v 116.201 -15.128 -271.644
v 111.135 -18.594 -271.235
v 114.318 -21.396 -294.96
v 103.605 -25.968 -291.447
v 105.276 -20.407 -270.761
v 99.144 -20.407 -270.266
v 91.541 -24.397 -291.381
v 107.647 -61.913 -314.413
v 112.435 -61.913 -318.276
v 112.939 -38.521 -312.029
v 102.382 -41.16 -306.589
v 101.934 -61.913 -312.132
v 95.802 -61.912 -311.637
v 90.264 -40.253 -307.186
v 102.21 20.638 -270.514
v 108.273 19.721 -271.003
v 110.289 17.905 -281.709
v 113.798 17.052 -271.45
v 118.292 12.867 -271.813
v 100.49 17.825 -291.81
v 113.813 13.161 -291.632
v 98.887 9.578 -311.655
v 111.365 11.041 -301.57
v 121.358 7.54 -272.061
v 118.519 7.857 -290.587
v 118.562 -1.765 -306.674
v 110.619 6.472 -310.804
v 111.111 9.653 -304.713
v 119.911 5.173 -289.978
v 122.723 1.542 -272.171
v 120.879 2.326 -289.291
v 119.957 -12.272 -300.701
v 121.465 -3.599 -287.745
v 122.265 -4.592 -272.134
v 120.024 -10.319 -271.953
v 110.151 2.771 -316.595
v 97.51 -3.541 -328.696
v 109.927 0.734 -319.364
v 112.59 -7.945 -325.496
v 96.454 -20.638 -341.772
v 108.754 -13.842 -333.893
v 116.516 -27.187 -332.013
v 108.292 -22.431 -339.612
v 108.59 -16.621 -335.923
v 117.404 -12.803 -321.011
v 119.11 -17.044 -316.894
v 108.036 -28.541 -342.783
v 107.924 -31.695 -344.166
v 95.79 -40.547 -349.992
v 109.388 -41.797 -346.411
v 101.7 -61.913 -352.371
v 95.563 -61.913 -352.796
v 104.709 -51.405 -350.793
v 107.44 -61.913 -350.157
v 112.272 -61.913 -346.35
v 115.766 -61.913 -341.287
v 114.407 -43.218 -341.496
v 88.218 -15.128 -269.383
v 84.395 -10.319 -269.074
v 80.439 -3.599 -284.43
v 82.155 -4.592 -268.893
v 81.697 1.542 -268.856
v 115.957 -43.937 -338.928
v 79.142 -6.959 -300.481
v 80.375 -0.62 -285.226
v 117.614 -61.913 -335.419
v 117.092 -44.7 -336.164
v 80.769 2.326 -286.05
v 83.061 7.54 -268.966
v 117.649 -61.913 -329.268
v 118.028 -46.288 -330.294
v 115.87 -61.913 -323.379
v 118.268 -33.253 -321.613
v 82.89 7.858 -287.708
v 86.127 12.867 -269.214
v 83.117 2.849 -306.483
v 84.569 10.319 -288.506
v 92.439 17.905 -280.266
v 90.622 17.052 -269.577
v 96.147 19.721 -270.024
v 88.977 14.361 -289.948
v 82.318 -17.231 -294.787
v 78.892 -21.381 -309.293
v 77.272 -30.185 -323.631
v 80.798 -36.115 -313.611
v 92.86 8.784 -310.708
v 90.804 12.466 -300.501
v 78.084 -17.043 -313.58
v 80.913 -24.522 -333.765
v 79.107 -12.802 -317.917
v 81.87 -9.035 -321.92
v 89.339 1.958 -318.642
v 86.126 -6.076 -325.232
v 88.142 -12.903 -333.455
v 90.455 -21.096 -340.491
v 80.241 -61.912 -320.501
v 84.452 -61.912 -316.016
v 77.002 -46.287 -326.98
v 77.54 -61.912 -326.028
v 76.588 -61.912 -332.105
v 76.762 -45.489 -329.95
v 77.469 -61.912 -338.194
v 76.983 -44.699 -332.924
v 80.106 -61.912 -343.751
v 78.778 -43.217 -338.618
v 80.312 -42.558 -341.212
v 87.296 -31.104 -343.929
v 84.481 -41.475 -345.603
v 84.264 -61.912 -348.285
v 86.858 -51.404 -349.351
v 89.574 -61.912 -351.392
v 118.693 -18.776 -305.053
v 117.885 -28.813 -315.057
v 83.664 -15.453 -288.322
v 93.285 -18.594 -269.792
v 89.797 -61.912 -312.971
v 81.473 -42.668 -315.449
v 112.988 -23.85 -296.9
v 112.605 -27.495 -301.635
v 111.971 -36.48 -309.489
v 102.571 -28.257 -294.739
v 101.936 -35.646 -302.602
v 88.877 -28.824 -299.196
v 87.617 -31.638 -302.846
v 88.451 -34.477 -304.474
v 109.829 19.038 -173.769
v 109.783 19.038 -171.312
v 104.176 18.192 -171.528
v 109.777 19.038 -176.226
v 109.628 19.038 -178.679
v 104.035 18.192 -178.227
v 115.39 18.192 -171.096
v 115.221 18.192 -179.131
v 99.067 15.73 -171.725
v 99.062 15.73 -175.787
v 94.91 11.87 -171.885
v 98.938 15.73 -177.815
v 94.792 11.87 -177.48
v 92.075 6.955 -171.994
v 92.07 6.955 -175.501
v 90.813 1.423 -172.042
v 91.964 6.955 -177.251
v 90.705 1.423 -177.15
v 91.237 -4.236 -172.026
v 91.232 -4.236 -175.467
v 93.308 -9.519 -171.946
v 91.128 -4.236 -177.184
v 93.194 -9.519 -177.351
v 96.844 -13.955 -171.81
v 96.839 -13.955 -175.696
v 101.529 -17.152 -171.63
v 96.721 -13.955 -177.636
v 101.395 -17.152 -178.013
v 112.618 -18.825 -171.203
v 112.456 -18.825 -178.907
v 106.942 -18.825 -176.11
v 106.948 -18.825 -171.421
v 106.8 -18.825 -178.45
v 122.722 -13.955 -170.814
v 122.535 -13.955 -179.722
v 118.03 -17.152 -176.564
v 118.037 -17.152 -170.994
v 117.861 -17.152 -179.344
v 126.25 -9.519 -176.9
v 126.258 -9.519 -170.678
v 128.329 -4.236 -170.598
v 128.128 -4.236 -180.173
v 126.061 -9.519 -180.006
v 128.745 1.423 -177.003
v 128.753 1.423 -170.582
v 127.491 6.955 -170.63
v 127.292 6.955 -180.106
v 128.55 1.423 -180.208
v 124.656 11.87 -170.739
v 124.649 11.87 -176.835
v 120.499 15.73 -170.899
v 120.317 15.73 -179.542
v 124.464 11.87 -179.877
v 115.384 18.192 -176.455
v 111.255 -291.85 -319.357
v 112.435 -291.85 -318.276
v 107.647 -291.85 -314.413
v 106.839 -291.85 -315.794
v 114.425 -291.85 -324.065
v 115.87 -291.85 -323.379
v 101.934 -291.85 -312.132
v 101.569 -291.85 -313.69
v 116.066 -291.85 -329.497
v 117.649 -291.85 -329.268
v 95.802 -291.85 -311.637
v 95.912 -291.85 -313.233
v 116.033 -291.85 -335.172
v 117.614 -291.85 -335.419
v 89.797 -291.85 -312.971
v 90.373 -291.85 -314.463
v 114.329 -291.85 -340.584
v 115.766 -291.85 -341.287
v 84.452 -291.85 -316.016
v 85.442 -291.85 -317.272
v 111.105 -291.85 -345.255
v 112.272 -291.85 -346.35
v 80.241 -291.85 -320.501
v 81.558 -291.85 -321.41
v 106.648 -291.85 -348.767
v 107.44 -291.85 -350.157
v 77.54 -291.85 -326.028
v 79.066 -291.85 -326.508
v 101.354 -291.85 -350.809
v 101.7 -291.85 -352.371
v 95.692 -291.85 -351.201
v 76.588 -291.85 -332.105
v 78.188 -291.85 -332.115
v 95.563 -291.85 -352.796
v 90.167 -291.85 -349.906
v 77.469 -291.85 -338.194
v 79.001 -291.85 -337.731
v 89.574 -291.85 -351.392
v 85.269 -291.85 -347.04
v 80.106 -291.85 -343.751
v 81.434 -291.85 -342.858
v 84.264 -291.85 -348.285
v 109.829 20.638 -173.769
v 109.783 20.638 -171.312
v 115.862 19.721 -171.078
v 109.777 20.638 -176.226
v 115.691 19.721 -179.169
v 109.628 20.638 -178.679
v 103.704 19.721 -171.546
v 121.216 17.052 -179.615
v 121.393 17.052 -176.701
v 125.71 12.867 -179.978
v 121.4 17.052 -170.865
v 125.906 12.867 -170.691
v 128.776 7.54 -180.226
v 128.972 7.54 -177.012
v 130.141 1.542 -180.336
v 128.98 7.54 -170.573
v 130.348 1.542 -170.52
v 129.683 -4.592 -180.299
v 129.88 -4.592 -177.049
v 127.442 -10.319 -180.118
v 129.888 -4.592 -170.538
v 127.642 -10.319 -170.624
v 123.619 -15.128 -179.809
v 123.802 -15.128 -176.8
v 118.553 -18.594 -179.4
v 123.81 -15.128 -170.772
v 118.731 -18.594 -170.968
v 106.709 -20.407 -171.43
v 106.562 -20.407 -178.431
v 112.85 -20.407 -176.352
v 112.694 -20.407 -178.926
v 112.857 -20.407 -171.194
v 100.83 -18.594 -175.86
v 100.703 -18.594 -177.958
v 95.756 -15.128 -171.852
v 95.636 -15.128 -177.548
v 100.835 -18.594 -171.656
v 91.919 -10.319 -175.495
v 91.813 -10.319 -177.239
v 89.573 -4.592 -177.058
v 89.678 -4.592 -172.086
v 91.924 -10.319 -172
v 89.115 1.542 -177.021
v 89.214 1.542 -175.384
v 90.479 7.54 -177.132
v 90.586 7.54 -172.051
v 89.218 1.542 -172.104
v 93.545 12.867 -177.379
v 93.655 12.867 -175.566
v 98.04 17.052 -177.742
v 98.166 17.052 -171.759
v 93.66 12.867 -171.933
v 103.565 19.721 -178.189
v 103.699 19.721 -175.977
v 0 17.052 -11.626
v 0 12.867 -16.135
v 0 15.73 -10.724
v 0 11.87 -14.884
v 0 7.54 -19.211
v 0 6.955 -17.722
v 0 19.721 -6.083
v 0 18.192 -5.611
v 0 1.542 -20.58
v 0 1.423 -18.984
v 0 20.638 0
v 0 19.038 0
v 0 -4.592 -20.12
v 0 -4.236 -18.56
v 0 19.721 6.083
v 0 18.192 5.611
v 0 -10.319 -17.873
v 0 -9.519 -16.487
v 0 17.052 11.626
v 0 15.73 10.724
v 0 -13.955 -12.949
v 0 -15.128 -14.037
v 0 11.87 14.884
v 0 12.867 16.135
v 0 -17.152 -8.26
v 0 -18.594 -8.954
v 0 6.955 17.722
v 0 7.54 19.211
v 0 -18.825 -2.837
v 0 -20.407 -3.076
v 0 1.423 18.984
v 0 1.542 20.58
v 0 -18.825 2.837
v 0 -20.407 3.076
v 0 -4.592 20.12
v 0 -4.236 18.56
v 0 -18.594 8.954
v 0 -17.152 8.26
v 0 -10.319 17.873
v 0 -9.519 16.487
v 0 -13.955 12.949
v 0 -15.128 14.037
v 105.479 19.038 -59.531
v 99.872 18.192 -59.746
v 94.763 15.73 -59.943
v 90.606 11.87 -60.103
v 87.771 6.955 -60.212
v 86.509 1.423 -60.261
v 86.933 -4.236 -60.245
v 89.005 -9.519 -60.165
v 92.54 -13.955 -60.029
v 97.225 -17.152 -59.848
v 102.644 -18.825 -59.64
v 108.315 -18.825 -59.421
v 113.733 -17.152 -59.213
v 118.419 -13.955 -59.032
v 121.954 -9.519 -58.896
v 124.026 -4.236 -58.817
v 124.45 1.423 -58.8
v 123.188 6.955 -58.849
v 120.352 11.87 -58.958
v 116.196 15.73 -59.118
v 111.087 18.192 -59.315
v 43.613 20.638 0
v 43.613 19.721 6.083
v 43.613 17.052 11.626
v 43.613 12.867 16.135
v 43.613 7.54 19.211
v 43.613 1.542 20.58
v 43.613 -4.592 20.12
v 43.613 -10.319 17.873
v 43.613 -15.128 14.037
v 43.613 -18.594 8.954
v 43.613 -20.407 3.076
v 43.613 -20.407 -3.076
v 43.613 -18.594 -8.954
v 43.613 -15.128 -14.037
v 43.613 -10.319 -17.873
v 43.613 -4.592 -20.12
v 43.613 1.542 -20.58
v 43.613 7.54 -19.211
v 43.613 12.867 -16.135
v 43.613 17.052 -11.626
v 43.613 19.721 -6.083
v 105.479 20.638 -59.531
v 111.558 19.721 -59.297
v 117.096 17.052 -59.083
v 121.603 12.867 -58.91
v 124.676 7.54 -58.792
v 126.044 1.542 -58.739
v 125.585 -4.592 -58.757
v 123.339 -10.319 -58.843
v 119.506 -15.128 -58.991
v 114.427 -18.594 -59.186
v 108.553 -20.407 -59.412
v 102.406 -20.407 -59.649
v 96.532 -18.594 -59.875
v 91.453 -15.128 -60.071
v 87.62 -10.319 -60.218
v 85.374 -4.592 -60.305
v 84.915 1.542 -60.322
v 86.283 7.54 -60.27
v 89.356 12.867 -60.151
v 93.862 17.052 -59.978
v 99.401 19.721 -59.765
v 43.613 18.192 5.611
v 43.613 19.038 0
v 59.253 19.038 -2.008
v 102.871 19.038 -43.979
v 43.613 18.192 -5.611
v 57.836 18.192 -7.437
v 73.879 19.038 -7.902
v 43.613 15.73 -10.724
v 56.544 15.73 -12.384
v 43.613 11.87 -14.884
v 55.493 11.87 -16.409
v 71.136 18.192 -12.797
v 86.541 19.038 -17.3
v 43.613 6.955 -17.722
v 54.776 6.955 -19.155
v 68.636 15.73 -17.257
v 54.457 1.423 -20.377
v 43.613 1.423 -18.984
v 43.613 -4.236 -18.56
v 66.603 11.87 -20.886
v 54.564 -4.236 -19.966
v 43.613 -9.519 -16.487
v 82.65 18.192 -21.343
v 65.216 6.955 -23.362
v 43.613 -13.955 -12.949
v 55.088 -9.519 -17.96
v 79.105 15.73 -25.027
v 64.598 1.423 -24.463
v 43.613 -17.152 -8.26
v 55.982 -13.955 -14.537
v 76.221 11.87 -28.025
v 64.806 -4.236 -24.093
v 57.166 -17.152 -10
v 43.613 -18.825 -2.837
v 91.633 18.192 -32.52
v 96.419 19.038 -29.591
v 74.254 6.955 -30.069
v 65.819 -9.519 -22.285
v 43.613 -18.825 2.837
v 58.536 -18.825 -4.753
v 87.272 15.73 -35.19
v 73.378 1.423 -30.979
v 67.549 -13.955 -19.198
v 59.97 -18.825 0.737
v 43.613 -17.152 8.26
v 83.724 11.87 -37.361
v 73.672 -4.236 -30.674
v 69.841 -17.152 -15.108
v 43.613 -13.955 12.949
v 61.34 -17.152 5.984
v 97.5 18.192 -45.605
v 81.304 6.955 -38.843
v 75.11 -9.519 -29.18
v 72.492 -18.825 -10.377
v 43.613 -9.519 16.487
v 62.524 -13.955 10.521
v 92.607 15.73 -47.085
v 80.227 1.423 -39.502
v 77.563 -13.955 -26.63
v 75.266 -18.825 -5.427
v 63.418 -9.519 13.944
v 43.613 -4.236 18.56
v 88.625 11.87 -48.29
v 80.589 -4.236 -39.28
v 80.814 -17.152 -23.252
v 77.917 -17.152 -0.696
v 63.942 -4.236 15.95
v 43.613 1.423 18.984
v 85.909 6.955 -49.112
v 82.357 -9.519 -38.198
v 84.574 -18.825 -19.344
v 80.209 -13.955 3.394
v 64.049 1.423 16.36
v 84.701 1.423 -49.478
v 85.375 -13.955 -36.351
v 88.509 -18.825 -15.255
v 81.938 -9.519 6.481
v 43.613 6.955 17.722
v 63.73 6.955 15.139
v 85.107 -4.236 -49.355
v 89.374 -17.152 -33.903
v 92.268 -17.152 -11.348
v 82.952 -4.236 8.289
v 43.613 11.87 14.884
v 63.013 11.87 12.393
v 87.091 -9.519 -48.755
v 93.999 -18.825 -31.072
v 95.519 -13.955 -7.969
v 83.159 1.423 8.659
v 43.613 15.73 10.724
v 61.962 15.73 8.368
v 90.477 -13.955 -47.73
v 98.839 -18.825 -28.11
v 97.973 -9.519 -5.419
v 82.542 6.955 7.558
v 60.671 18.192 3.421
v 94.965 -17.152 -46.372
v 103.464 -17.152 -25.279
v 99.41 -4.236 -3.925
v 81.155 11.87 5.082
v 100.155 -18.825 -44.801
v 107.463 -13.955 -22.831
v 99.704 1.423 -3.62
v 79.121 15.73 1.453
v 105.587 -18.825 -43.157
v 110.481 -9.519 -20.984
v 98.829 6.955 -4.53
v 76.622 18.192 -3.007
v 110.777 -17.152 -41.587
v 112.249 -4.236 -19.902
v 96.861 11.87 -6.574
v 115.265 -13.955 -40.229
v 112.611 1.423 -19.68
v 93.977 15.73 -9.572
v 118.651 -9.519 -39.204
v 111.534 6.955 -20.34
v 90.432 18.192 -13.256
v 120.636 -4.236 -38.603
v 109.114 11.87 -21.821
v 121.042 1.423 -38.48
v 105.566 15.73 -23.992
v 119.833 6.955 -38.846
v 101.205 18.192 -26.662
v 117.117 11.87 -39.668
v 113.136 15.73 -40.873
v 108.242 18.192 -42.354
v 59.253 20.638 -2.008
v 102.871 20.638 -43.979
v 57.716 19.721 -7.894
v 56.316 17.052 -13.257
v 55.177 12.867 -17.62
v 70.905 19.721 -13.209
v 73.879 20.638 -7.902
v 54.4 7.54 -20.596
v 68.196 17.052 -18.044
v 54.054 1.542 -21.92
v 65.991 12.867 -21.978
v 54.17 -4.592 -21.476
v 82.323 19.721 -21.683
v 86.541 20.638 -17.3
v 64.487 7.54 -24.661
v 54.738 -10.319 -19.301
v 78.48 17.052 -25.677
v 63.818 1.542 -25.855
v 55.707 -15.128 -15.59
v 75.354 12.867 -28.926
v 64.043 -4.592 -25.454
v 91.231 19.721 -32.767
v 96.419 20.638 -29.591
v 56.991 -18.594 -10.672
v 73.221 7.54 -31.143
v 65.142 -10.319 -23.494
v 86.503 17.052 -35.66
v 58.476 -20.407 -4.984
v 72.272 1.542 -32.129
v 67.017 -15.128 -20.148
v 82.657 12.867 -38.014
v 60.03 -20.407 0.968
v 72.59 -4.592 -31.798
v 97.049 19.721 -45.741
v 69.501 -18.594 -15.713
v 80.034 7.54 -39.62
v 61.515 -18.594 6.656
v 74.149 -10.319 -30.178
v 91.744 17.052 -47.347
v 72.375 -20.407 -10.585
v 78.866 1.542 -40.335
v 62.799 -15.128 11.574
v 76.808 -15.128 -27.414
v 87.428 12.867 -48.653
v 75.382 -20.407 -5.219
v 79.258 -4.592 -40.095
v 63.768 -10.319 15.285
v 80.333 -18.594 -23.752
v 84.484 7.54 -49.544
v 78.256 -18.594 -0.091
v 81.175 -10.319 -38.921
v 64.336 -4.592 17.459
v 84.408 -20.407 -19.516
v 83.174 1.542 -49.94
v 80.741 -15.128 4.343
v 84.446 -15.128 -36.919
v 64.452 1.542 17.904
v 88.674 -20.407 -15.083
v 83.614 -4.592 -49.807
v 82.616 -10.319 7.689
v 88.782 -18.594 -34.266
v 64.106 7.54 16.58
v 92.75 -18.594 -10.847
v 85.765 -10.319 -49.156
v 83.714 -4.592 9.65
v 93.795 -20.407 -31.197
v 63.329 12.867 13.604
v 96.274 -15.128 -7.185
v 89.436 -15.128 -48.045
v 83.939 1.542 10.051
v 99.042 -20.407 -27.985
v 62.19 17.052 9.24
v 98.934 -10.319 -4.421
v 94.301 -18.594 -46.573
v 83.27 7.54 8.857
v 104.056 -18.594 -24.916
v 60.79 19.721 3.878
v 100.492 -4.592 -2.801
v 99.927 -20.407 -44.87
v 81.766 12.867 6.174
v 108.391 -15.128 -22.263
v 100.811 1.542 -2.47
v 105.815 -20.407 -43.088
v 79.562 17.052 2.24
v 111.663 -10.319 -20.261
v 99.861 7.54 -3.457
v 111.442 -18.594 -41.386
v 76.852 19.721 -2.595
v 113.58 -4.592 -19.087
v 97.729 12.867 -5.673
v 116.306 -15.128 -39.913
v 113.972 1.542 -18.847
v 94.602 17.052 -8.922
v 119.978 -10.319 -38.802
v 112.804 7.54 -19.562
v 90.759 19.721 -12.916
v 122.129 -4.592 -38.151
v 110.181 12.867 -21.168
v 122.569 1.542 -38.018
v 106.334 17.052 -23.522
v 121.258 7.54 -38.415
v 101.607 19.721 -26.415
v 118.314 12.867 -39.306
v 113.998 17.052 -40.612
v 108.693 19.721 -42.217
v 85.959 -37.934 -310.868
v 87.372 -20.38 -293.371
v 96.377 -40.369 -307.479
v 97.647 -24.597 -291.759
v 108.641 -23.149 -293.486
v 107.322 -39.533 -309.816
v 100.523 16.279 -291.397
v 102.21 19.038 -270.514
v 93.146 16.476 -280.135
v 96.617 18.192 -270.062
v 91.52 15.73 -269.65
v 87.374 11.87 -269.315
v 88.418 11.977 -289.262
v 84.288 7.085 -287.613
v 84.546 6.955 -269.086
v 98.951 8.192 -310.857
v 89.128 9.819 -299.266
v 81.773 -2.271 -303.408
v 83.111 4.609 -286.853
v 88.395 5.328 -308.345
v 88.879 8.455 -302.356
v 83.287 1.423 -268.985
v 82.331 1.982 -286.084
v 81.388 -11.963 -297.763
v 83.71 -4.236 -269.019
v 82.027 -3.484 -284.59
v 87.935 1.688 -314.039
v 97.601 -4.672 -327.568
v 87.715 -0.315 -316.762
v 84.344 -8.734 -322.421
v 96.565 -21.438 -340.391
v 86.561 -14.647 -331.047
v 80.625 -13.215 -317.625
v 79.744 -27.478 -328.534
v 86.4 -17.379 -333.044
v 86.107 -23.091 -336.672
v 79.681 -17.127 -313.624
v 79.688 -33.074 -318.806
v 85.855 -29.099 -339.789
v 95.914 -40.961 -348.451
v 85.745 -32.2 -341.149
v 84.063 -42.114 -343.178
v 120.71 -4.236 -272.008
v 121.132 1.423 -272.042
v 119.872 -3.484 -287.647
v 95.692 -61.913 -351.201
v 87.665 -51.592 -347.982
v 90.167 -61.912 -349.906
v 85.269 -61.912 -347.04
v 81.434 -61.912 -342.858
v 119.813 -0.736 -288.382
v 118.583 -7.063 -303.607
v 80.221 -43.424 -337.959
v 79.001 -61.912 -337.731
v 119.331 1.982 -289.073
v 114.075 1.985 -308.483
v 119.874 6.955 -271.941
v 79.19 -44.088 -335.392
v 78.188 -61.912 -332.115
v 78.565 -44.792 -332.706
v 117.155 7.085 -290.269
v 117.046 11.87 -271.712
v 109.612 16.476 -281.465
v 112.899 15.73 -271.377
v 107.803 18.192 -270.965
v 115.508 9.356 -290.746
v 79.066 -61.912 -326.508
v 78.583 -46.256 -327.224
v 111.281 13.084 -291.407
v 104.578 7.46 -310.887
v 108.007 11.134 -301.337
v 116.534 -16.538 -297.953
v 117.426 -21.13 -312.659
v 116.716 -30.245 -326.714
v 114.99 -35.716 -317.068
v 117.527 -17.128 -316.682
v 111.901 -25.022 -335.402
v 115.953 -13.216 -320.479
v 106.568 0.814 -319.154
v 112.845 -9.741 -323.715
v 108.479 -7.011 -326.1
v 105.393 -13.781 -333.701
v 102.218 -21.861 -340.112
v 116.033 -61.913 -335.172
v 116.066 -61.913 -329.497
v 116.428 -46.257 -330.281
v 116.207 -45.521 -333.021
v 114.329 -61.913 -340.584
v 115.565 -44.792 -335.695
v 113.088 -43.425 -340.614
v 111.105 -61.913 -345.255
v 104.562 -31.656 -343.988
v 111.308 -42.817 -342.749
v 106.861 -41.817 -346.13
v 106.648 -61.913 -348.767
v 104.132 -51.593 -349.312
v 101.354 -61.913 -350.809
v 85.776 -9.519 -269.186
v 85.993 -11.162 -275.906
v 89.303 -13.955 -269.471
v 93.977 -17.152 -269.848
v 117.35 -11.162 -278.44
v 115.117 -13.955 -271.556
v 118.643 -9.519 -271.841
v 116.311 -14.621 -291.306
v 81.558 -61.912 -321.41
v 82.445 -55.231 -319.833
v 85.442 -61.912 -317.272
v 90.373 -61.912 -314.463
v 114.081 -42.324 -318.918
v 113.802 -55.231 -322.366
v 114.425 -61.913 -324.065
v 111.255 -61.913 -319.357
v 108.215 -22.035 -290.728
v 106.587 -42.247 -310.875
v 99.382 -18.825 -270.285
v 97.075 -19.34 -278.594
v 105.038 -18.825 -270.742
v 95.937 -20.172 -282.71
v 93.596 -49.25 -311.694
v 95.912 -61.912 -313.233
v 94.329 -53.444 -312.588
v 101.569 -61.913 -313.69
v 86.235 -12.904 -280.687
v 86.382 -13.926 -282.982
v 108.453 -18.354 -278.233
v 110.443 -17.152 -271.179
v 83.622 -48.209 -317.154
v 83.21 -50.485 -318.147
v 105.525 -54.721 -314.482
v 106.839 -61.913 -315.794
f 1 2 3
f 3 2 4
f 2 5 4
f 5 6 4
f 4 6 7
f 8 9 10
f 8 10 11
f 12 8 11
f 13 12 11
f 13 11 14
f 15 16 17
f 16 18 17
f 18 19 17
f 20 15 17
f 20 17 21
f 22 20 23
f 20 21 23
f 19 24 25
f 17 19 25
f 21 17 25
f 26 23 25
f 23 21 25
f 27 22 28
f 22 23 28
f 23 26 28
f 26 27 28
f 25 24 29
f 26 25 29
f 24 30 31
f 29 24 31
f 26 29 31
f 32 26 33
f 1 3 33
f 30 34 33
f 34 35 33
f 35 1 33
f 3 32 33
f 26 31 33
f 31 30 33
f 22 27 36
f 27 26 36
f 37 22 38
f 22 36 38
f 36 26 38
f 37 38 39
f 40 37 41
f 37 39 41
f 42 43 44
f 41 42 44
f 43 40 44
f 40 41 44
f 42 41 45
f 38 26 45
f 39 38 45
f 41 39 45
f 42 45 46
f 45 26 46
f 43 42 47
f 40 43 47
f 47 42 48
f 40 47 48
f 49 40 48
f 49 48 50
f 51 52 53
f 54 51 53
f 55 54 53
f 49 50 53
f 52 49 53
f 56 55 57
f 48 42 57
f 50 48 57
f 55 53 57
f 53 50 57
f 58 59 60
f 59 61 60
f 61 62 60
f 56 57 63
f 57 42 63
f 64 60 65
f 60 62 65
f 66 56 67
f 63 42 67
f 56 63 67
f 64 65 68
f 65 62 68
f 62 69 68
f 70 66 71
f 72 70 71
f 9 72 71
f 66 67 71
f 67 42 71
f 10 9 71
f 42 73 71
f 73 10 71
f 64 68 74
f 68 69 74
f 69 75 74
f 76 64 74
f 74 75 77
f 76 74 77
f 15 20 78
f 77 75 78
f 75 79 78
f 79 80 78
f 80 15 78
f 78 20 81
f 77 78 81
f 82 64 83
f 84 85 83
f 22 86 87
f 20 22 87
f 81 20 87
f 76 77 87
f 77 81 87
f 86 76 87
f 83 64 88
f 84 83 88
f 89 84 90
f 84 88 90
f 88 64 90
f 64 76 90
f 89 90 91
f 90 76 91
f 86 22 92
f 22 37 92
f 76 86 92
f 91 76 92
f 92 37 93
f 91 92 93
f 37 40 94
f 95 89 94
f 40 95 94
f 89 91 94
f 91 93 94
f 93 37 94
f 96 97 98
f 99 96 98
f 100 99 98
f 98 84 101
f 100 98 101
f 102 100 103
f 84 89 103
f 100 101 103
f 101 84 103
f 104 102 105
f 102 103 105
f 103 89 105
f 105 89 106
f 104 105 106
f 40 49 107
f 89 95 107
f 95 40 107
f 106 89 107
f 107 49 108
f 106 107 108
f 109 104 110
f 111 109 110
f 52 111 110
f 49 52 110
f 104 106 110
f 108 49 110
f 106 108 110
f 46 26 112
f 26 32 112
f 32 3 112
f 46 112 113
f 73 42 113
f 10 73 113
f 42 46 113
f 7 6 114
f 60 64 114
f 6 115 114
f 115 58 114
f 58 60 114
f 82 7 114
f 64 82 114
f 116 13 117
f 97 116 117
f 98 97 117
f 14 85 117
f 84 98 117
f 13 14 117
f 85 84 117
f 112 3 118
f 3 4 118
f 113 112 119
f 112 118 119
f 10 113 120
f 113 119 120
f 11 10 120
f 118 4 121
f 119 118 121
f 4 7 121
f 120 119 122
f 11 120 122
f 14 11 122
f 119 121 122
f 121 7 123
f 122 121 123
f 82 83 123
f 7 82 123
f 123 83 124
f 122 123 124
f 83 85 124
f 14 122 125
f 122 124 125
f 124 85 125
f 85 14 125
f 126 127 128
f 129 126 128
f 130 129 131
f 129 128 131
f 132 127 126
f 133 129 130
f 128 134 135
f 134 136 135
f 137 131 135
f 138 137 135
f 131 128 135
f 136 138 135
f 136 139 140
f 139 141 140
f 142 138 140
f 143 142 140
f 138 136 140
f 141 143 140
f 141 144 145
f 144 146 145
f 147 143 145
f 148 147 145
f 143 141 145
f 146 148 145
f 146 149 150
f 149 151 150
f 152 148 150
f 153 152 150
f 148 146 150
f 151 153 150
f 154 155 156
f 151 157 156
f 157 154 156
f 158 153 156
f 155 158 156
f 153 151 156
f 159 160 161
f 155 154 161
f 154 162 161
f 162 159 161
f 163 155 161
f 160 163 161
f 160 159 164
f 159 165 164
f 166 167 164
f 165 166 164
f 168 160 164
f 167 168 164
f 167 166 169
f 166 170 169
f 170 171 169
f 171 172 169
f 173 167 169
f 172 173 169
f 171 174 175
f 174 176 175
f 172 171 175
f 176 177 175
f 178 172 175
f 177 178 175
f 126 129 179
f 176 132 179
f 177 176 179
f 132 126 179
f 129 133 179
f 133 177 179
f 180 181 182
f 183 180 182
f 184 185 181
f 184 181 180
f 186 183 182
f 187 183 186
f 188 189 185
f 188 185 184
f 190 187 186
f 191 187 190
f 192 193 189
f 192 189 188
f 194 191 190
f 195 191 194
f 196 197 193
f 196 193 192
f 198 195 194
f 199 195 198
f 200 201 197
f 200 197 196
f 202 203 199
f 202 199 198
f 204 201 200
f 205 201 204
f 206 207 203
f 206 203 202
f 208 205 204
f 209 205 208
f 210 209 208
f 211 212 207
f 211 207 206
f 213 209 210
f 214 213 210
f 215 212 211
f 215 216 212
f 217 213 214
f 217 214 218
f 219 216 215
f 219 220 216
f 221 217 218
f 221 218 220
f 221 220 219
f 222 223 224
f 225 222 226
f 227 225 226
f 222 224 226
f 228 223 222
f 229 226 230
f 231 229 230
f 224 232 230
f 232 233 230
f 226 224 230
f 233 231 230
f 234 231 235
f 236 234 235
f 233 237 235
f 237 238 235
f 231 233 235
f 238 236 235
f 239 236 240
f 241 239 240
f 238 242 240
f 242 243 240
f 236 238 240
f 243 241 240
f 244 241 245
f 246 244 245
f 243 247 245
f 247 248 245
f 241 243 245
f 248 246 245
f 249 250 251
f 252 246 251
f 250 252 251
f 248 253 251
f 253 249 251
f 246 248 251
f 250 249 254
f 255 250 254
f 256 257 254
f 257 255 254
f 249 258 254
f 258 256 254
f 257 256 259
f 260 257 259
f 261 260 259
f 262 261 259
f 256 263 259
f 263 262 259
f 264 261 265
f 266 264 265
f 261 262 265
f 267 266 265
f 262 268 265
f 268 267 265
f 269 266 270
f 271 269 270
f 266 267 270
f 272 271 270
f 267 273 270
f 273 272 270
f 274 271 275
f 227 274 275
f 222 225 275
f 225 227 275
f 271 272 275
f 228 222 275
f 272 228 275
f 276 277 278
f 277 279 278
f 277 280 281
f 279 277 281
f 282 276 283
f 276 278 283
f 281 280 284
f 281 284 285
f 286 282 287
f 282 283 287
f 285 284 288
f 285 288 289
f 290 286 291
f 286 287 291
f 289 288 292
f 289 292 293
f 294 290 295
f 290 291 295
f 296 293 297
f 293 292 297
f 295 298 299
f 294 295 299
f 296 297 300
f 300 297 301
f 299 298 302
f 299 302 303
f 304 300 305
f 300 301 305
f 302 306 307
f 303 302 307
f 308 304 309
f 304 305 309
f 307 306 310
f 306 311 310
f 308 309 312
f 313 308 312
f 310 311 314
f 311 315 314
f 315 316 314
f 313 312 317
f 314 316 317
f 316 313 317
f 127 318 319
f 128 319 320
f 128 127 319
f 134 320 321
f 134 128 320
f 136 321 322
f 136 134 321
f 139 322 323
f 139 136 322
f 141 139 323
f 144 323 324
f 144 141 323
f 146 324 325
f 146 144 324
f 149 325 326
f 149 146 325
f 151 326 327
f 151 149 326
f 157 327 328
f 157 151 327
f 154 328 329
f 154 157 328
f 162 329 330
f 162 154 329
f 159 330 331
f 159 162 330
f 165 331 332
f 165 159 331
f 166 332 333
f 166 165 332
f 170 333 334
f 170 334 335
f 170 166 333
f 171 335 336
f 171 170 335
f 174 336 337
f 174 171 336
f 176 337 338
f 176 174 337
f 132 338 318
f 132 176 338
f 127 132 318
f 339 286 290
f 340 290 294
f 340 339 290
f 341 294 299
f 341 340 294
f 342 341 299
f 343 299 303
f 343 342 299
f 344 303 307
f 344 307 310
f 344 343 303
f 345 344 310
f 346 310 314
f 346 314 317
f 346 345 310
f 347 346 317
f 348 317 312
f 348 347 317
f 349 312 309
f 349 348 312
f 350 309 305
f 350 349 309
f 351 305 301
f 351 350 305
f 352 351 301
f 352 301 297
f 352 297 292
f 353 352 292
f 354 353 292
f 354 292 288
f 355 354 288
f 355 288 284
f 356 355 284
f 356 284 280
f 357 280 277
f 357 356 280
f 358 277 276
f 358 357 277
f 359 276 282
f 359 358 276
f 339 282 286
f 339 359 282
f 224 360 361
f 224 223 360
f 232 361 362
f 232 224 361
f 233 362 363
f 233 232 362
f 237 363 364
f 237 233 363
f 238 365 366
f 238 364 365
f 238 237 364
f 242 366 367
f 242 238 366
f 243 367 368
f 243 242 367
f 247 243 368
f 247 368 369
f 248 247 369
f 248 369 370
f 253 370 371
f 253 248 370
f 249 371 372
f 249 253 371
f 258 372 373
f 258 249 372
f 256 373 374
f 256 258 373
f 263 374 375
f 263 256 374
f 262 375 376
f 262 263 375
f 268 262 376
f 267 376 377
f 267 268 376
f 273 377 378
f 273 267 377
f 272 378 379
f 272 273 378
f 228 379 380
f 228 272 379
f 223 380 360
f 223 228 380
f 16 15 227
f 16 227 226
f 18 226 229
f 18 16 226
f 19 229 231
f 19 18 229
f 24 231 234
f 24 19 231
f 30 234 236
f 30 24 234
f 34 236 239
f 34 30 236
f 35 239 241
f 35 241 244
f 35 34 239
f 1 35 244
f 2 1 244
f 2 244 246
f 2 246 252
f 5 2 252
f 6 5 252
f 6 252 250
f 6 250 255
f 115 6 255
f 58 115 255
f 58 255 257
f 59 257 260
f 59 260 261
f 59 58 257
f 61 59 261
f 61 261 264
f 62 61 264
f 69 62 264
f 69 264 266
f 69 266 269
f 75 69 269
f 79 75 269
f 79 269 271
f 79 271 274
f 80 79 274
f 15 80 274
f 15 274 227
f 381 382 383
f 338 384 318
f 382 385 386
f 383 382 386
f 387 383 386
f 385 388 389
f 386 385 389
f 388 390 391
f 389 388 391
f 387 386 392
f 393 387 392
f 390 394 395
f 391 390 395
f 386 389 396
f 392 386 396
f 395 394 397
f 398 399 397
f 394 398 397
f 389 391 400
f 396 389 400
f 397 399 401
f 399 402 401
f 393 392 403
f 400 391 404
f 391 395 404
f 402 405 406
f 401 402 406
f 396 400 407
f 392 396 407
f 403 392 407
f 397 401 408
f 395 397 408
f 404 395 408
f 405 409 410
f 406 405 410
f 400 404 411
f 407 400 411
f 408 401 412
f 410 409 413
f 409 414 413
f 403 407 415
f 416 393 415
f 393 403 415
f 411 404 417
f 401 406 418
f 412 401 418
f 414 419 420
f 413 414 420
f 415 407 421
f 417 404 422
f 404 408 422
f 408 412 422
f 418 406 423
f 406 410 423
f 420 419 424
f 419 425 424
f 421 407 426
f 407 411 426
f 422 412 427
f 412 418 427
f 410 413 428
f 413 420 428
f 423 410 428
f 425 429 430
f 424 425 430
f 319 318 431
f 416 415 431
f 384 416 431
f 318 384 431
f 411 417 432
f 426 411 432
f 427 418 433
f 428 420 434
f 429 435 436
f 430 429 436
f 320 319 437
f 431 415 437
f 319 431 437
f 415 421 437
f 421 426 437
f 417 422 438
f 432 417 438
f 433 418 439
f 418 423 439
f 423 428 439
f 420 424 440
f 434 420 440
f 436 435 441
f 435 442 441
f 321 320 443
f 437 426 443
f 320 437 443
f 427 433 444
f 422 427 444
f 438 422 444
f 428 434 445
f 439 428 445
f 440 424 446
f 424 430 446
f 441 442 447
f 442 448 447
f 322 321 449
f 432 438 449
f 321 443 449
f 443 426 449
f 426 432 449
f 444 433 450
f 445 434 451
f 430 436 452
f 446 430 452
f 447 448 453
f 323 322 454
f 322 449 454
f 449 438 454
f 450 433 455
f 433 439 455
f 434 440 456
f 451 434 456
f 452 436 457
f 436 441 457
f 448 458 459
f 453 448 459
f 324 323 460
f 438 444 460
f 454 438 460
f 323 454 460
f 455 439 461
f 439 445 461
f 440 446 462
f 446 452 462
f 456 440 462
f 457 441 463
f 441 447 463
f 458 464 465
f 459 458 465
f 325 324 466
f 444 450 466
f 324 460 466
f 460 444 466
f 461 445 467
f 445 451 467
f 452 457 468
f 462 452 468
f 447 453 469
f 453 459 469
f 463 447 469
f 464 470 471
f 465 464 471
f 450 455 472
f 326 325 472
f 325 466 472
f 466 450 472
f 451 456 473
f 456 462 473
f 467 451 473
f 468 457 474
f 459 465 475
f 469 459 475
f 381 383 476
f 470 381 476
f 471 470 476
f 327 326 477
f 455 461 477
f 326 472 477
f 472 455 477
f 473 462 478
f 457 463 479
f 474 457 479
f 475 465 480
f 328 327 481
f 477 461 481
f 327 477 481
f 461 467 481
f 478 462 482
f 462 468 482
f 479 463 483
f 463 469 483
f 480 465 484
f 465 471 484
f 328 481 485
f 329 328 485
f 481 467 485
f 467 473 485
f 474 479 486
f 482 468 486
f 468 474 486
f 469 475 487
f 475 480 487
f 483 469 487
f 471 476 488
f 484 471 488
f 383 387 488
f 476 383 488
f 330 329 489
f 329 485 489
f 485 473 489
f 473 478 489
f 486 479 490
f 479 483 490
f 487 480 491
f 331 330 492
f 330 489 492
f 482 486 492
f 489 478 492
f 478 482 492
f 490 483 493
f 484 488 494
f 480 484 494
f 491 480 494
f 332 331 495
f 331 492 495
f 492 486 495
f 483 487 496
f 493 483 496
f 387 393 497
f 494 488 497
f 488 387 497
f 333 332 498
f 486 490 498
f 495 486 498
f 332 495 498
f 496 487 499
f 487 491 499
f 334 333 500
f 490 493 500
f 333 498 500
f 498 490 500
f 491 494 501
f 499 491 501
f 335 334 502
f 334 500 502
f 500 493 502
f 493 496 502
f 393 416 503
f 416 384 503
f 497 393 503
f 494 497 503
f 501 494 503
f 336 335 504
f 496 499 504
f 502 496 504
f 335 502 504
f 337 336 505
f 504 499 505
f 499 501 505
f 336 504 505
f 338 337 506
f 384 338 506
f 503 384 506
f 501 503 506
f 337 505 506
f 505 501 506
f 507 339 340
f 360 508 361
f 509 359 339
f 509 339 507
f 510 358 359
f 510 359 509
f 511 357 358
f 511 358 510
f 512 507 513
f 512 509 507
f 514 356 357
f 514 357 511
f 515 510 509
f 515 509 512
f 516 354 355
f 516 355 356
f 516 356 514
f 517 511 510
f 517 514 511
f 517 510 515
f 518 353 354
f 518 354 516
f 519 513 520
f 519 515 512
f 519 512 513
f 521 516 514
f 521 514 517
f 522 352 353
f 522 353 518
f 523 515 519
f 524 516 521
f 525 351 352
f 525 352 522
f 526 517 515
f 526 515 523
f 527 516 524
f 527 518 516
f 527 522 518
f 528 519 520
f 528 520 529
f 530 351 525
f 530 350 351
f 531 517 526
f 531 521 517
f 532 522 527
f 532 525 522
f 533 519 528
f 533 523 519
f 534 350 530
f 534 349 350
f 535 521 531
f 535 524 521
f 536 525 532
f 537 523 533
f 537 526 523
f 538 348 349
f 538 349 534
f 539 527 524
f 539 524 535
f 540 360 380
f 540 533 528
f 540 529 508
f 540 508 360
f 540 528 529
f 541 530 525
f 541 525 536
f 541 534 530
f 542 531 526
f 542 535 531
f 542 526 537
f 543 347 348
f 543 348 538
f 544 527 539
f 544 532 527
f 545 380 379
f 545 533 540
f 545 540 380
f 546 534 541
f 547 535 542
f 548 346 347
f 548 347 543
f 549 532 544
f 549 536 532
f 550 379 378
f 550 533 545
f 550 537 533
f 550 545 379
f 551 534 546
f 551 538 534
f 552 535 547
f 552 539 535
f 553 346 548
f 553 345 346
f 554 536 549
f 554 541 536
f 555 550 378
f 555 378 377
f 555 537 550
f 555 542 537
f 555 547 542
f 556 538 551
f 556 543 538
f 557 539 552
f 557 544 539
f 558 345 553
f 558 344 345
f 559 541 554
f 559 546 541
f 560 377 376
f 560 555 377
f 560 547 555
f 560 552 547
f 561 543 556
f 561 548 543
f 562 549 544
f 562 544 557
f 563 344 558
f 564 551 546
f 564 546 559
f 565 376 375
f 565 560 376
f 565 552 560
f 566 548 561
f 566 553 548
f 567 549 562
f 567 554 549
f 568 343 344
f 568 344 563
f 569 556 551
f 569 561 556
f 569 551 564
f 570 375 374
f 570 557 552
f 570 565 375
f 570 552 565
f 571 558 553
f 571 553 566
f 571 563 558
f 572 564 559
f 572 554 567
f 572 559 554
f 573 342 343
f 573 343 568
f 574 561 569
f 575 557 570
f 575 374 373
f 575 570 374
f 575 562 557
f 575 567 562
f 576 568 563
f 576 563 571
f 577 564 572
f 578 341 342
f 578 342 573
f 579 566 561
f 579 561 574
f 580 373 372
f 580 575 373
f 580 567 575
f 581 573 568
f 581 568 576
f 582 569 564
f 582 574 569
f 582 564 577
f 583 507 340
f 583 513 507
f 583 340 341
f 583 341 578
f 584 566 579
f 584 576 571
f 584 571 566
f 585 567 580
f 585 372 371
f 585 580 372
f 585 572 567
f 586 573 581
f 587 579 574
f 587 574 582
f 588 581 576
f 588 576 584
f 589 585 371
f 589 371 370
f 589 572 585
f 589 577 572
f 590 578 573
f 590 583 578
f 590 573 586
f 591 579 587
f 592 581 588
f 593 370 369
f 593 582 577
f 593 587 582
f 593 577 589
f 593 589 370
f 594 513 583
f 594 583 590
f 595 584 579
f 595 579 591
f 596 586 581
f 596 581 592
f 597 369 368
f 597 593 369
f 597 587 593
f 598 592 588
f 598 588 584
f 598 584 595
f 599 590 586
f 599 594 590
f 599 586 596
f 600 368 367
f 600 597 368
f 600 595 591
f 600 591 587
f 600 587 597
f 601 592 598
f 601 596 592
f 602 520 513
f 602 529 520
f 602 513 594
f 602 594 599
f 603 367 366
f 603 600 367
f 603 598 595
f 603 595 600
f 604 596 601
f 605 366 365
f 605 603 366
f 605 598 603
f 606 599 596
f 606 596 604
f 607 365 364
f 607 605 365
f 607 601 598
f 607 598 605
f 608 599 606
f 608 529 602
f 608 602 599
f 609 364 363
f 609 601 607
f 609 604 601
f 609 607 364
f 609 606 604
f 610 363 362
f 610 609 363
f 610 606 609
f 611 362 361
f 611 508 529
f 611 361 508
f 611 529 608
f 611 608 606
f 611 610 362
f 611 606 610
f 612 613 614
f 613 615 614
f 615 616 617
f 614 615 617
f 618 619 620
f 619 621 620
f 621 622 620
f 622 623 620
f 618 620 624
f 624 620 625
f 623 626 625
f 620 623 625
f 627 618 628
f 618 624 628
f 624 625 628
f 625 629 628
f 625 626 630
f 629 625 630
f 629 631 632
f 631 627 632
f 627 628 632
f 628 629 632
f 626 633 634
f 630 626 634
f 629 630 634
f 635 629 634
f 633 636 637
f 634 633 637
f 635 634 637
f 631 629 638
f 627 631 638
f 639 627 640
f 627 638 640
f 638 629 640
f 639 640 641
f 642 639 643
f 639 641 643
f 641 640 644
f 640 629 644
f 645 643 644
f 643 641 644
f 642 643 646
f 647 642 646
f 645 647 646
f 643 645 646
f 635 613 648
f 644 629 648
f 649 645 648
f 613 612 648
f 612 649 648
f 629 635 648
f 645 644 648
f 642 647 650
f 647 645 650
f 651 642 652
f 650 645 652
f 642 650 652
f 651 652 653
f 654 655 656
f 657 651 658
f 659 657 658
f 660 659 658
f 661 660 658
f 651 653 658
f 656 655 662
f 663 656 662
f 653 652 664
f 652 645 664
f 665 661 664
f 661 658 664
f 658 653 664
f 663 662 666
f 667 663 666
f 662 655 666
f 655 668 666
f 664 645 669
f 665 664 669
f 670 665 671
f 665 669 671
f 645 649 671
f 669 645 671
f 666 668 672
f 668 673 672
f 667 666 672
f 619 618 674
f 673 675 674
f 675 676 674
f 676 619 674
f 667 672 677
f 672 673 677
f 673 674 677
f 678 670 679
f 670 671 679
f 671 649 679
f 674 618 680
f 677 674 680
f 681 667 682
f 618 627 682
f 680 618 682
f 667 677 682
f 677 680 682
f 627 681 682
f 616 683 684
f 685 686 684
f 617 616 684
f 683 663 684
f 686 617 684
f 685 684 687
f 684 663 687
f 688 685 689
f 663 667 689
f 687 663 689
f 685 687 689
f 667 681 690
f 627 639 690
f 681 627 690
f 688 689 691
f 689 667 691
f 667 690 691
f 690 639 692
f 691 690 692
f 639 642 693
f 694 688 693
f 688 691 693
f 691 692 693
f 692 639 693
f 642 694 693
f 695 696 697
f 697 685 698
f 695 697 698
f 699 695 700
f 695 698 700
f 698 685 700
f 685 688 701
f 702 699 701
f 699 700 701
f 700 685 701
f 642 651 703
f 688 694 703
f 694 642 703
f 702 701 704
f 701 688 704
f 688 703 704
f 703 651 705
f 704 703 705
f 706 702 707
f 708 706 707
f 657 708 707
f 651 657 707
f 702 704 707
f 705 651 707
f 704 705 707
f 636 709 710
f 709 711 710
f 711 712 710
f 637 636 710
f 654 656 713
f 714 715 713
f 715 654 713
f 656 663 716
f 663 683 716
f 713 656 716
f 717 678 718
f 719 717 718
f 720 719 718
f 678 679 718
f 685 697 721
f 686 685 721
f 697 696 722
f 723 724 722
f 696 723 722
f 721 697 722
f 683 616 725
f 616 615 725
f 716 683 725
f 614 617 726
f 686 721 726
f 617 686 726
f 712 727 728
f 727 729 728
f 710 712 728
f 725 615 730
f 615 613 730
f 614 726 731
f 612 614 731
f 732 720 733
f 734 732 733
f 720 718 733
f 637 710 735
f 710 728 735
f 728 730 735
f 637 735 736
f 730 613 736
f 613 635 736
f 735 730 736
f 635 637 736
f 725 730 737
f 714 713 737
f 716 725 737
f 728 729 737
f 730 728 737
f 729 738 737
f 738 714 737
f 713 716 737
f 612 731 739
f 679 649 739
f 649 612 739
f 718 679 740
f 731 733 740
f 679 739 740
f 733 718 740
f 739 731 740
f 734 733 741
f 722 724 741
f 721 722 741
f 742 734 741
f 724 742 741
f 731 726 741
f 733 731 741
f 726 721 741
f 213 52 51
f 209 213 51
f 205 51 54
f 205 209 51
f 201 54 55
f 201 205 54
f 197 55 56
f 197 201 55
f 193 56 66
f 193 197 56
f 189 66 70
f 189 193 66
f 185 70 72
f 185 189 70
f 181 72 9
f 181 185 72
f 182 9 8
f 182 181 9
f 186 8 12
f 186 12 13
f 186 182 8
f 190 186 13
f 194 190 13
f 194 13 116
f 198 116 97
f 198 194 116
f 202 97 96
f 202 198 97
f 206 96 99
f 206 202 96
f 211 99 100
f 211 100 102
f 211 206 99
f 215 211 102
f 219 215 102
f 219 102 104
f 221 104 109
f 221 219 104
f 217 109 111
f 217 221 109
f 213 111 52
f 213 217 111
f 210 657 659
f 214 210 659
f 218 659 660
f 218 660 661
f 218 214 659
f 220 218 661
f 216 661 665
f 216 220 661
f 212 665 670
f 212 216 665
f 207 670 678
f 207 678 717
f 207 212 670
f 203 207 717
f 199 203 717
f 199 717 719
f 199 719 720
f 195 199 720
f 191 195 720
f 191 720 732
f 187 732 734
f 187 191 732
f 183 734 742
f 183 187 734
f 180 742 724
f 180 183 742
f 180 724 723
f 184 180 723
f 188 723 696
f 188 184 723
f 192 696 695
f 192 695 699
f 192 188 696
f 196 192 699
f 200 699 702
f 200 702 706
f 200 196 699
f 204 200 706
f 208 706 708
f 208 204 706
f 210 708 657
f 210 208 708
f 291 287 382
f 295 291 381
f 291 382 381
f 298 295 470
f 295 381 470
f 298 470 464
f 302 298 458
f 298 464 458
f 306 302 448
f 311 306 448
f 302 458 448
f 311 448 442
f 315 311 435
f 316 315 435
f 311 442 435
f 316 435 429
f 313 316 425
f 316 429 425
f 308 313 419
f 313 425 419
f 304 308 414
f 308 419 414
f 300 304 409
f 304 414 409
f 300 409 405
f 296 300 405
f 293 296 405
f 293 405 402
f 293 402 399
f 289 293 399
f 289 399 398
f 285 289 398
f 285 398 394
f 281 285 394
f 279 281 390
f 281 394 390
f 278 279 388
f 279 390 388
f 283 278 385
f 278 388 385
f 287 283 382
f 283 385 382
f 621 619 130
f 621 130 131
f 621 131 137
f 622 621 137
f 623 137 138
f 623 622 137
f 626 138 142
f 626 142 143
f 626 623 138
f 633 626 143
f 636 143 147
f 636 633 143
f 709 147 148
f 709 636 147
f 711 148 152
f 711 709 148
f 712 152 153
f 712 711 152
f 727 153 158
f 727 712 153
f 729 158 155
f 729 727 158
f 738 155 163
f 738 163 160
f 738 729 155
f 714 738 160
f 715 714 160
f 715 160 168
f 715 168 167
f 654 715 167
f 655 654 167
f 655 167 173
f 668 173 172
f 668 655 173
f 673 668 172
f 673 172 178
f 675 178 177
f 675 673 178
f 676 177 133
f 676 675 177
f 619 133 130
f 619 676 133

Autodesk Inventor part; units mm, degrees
sketch "Sketch1" plane through (0, 0, 0) normal (1, 0, 0) x (0, 1, 0)
  line L0 (0, 0) -> (0, -175)
  line L1 (0, -175) -> (0, -332.225)
  line L2 (0, -332.225) -> (-291.85, -332.225)
  line L3 (0, 0) -> (0, -103.1875) construction
  line L4 (0, -103.1875) -> (0, -109.925) construction
  line L5 (0, -109.925) -> (0, -97.225) construction
  line L6 (0, -97.225) -> (-291.85, -97.225) construction
  dimension "d0" = 332.225
  dimension "d1" = 0
  dimension "d4" = 175
  dimension "d5" = 291.85
  dimension "d6" = 103.1875
  dimension "d7" = 97.225
  dimension "d8" = 109.925
ref_plane "Work Plane1" through (103.1875, 0, 0) normal (1, 0, 0) x (0, 1, 0)
ref_plane "Work Plane2" through (109.925, 0, 0) normal (1, 0, 0) x (0, 1, 0)
ref_plane "Work Plane3" through (97.225, 0, 0) normal (1, 0, 0) x (0, 1, 0)
sketch "Sketch2" plane through (103.1875, 0, 0) normal (1, 0, 0) x (0, 1, 0)
  point P0 (0, 0)
  point P1 (0, 0)
sketch "Sketch3" plane through (109.925, 0, 0) normal (1, 0, 0) x (0, 1, 0)
  point P0 (0, 0)
  point P1 (0, -175)
  point P2 (0, -332.225)
sketch "Sketch4" plane through (97.225, 0, 0) normal (1, 0, 0) x (0, 1, 0)
  point P0 (0, 0)
  point P1 (-291.85, -332.225)
  point P2 (0, -332.225)
sketch "Sketch5" plane through (0, 0, 0) normal (1, 0, 0) x (0, 1, 0)
  circle A0 centre (0, 0) radius 20.6375
  circle A1 centre (0, 0) radius 19.0375
  dimension "d15" = 1.6
  dimension "d17" = 41.275
sketch3d "3D Sketch1"
  line L0 (0, 0, 0) -> (43.6128, 0, 0)
  arc A0 (43.6128, 0, 0) -> (105.4794, 0, -59.5306) centre (43.6128, 0, -61.9125) ccw
  line L1 (105.4794, 0, -59.5306) -> (109.783, 0, -171.312)
  arc A1 (109.783, 0, -171.312) -> (109.6278, 0, -178.6787) centre (47.9163, 0, -173.6939) ccw
  line L2 (109.6278, 0, -178.6787) -> (102.2098, 0, -270.5135)
  arc A2 (102.2098, 0, -270.5135) -> (97.225, -61.9125, -332.225) centre (102.2098, -61.9125, -270.5135) ccw
  line L3 (97.225, -61.9125, -332.225) -> (97.225, -291.85, -332.225)
  dimension "d14" = 61.9125
  dimension "d12" = 61.9125
  dimension "d13" = 61.9125
sweep "Sweep1" add profiles "Sketch5" path "3D Sketch1"
equation "\"d14\" = d12"
equation "\"d13\" = d12"
equation "\"d9\" = d6"
equation "\"d10\" = d8"
equation "\"d11\" = d7"
properties part number "exhaust header right pipe 4" material "Steel"
